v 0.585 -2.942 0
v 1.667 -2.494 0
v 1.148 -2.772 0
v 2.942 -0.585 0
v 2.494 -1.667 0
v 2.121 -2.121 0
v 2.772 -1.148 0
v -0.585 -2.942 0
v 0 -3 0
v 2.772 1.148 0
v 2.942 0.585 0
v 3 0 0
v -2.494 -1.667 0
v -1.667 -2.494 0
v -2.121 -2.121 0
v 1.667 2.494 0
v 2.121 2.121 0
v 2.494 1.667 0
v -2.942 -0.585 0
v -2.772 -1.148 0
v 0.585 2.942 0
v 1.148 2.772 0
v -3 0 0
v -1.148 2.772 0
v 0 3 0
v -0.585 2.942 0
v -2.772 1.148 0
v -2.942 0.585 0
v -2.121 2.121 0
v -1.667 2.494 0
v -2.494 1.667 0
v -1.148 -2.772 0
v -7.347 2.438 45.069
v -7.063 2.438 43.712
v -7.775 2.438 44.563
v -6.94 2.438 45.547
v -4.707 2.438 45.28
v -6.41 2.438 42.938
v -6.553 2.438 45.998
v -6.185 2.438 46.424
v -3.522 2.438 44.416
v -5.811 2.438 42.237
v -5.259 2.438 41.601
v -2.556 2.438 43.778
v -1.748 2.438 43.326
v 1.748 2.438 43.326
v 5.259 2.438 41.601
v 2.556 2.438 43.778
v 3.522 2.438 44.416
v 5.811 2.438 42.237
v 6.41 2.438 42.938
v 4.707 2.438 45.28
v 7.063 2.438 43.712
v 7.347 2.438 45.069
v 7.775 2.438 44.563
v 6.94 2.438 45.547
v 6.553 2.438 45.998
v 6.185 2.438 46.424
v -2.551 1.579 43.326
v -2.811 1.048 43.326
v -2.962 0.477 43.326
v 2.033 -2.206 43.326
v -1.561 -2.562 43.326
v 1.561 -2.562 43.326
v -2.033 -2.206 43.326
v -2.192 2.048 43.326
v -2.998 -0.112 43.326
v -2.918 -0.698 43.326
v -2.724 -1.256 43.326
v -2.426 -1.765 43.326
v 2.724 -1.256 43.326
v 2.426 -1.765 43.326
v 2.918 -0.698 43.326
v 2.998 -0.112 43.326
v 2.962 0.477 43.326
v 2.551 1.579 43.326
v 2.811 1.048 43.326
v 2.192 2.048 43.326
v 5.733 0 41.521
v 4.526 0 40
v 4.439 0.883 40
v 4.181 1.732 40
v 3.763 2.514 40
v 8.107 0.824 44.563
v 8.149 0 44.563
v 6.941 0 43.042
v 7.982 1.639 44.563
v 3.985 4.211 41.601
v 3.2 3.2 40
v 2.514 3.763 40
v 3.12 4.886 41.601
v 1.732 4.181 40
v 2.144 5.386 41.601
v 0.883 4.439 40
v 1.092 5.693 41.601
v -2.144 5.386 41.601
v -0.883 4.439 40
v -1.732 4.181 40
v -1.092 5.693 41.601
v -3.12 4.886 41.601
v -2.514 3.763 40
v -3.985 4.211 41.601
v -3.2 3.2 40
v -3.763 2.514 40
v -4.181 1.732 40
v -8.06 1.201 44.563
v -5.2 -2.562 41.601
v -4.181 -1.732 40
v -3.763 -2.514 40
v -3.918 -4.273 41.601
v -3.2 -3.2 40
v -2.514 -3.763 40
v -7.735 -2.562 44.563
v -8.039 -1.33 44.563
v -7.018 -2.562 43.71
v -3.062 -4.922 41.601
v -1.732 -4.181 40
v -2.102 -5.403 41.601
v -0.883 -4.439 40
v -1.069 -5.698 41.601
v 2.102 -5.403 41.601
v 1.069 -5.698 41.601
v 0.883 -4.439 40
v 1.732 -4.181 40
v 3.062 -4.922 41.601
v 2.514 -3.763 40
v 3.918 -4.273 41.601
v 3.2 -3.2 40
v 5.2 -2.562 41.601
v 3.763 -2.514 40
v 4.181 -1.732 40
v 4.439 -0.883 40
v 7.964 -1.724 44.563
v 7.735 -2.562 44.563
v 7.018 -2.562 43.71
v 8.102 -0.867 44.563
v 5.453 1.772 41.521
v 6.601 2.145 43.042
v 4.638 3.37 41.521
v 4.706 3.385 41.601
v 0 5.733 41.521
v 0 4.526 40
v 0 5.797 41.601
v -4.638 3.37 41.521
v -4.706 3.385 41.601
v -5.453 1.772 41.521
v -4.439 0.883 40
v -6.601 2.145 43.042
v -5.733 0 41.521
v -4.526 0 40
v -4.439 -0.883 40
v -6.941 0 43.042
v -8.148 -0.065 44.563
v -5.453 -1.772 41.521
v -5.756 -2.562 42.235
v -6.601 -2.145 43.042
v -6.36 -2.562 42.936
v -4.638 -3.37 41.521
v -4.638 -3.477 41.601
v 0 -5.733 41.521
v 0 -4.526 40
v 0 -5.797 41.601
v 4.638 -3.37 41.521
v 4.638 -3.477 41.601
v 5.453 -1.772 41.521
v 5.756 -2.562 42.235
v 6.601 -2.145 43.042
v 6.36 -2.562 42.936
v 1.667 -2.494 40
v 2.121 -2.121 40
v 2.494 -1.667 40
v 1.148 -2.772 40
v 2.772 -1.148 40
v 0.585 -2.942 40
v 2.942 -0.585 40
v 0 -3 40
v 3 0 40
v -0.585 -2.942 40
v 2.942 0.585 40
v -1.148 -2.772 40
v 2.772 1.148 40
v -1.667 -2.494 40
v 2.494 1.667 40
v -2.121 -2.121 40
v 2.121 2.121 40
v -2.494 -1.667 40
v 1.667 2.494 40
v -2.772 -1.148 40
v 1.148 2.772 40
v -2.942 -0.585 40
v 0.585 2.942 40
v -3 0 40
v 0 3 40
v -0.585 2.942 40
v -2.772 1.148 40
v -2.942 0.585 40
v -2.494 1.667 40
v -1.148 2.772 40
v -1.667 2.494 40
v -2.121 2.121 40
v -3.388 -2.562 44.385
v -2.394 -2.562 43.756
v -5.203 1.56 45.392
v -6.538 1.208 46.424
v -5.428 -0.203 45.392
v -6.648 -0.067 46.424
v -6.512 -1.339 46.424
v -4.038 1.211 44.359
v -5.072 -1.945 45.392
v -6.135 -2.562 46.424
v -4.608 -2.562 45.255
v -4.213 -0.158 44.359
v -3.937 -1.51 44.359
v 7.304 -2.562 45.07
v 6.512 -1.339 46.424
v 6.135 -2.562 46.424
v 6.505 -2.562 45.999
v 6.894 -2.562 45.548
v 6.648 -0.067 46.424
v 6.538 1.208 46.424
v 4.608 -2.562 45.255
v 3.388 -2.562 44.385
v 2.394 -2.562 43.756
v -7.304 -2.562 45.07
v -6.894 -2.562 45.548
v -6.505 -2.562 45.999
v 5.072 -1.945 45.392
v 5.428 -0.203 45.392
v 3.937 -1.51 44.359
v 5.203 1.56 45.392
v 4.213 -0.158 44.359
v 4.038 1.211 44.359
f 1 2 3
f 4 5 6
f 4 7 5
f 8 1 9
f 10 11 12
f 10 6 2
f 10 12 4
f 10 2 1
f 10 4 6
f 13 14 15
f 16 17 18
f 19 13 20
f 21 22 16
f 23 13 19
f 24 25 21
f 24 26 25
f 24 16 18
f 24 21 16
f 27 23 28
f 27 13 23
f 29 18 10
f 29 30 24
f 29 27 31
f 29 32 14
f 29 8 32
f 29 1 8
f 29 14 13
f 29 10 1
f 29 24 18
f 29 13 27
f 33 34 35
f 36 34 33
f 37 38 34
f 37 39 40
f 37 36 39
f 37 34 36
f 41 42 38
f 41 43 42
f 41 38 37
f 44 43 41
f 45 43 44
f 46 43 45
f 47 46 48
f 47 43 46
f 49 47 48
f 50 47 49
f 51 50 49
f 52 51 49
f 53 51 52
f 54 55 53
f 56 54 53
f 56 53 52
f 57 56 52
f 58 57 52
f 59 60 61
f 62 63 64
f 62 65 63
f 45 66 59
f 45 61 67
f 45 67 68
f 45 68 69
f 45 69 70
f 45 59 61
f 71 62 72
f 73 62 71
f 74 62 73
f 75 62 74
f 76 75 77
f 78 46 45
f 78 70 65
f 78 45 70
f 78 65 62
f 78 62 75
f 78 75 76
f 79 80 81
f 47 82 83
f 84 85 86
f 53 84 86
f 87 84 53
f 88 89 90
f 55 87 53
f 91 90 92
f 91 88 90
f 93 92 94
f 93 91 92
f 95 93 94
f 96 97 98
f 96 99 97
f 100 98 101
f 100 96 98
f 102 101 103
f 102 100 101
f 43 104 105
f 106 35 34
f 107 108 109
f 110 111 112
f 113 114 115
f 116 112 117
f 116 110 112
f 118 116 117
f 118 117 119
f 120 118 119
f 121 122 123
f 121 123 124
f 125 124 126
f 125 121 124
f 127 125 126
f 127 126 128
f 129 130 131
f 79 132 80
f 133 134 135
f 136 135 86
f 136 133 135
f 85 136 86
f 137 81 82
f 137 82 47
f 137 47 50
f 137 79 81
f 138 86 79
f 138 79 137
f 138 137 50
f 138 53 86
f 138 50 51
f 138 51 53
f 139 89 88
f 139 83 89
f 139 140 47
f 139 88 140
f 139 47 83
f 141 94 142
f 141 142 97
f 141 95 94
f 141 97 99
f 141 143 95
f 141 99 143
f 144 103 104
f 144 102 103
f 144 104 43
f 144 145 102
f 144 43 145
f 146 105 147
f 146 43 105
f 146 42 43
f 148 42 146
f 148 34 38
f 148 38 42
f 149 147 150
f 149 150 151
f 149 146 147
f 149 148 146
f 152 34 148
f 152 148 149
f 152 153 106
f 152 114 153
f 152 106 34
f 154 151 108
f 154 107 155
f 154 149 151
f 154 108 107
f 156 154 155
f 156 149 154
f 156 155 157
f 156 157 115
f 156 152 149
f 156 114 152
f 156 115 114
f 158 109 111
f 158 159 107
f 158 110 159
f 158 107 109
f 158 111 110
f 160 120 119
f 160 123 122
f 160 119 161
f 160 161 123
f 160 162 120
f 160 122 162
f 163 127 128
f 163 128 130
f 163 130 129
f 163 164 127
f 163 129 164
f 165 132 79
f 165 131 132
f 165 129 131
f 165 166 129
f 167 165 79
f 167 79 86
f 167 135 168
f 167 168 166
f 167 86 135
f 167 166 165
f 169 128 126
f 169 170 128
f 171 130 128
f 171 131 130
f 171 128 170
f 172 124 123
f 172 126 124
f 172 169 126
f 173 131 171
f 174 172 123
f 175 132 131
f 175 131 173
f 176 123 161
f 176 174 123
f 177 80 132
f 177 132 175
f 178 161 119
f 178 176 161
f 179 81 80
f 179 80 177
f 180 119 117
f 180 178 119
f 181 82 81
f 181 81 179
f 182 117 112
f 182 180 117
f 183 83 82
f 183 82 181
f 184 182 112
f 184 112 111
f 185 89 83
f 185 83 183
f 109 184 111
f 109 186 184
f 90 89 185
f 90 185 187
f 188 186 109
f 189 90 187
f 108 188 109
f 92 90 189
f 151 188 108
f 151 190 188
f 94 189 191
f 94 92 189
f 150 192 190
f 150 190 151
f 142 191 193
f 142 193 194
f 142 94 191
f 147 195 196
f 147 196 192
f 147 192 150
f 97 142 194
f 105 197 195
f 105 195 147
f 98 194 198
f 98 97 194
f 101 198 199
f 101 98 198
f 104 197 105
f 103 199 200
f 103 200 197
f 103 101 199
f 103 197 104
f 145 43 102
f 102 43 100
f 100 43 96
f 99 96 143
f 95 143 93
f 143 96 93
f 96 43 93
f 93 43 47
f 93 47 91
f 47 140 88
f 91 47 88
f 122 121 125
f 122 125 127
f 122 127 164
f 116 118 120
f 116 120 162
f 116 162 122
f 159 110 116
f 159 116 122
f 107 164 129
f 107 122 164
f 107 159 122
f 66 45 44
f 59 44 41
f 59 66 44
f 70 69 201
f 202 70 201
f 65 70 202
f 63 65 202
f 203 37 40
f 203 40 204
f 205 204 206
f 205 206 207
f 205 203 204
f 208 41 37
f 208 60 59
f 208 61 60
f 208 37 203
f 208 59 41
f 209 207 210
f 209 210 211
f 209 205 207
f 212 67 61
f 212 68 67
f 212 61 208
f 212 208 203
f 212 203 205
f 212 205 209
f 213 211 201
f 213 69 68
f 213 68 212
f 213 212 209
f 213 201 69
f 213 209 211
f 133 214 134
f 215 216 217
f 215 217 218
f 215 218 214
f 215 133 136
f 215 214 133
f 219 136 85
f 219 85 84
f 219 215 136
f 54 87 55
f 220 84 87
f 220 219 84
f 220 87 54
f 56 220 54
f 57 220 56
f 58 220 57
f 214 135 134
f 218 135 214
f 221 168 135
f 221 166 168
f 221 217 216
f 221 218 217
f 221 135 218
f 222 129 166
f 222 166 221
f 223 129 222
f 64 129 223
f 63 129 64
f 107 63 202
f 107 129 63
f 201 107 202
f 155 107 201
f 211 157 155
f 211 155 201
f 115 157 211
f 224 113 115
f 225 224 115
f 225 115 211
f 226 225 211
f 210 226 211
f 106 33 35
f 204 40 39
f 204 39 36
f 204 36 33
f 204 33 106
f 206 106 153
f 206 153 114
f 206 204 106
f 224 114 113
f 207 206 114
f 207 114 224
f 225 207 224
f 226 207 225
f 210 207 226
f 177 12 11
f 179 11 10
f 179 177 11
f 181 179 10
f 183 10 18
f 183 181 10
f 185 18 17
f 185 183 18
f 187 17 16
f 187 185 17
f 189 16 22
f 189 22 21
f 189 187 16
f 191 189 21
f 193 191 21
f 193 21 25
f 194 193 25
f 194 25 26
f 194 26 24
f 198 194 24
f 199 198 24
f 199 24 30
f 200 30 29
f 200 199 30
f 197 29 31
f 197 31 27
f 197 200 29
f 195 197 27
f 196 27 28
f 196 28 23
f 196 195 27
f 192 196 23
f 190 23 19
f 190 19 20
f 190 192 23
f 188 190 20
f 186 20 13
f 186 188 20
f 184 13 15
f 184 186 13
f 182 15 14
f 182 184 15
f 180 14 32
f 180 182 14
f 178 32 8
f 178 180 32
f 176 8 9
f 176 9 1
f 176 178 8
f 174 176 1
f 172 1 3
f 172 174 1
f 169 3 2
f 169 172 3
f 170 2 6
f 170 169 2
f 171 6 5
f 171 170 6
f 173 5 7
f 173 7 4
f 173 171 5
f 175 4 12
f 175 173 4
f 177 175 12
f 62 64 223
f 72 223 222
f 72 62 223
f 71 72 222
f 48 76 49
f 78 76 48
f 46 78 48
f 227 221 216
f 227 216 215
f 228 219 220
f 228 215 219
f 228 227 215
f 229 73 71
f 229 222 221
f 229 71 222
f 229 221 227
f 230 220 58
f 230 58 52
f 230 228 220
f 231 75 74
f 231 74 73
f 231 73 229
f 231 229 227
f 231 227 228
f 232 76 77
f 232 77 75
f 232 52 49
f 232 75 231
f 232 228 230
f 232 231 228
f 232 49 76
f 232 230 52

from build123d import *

# Parameters (mm, degrees)
F2_W     = 8.886791
F2_H     = 11.736567
F2_W_2   = 7.621294
F3_DEPTH = 20


with BuildPart() as f1:
    # F0 (on Front) → F1 (revolve)
    with BuildSketch(Plane.XZ):
        Polygon((0, 43.325846), (0, 0), (3, 0), (3, 40), (4.52552, 40), (8.148538, 44.563168), (6.648163, 46.424412), (3, 43.325846), align=None)
    revolve(axis=Axis((0, 0, 21.662923), (0, 0, 1)))

    # F2 (on Right) → F3 (cut, symmetric)
    with BuildSketch(Plane.YZ):
        with Locations((-7.005405, 47.46977)):
            Rectangle(F2_W, F2_H)
        with Locations((6.248638, 47.46977)):
            Rectangle(F2_W_2, F2_H)
    extrude(amount=F3_DEPTH, both=True, mode=Mode.SUBTRACT)


solid = f1.part
